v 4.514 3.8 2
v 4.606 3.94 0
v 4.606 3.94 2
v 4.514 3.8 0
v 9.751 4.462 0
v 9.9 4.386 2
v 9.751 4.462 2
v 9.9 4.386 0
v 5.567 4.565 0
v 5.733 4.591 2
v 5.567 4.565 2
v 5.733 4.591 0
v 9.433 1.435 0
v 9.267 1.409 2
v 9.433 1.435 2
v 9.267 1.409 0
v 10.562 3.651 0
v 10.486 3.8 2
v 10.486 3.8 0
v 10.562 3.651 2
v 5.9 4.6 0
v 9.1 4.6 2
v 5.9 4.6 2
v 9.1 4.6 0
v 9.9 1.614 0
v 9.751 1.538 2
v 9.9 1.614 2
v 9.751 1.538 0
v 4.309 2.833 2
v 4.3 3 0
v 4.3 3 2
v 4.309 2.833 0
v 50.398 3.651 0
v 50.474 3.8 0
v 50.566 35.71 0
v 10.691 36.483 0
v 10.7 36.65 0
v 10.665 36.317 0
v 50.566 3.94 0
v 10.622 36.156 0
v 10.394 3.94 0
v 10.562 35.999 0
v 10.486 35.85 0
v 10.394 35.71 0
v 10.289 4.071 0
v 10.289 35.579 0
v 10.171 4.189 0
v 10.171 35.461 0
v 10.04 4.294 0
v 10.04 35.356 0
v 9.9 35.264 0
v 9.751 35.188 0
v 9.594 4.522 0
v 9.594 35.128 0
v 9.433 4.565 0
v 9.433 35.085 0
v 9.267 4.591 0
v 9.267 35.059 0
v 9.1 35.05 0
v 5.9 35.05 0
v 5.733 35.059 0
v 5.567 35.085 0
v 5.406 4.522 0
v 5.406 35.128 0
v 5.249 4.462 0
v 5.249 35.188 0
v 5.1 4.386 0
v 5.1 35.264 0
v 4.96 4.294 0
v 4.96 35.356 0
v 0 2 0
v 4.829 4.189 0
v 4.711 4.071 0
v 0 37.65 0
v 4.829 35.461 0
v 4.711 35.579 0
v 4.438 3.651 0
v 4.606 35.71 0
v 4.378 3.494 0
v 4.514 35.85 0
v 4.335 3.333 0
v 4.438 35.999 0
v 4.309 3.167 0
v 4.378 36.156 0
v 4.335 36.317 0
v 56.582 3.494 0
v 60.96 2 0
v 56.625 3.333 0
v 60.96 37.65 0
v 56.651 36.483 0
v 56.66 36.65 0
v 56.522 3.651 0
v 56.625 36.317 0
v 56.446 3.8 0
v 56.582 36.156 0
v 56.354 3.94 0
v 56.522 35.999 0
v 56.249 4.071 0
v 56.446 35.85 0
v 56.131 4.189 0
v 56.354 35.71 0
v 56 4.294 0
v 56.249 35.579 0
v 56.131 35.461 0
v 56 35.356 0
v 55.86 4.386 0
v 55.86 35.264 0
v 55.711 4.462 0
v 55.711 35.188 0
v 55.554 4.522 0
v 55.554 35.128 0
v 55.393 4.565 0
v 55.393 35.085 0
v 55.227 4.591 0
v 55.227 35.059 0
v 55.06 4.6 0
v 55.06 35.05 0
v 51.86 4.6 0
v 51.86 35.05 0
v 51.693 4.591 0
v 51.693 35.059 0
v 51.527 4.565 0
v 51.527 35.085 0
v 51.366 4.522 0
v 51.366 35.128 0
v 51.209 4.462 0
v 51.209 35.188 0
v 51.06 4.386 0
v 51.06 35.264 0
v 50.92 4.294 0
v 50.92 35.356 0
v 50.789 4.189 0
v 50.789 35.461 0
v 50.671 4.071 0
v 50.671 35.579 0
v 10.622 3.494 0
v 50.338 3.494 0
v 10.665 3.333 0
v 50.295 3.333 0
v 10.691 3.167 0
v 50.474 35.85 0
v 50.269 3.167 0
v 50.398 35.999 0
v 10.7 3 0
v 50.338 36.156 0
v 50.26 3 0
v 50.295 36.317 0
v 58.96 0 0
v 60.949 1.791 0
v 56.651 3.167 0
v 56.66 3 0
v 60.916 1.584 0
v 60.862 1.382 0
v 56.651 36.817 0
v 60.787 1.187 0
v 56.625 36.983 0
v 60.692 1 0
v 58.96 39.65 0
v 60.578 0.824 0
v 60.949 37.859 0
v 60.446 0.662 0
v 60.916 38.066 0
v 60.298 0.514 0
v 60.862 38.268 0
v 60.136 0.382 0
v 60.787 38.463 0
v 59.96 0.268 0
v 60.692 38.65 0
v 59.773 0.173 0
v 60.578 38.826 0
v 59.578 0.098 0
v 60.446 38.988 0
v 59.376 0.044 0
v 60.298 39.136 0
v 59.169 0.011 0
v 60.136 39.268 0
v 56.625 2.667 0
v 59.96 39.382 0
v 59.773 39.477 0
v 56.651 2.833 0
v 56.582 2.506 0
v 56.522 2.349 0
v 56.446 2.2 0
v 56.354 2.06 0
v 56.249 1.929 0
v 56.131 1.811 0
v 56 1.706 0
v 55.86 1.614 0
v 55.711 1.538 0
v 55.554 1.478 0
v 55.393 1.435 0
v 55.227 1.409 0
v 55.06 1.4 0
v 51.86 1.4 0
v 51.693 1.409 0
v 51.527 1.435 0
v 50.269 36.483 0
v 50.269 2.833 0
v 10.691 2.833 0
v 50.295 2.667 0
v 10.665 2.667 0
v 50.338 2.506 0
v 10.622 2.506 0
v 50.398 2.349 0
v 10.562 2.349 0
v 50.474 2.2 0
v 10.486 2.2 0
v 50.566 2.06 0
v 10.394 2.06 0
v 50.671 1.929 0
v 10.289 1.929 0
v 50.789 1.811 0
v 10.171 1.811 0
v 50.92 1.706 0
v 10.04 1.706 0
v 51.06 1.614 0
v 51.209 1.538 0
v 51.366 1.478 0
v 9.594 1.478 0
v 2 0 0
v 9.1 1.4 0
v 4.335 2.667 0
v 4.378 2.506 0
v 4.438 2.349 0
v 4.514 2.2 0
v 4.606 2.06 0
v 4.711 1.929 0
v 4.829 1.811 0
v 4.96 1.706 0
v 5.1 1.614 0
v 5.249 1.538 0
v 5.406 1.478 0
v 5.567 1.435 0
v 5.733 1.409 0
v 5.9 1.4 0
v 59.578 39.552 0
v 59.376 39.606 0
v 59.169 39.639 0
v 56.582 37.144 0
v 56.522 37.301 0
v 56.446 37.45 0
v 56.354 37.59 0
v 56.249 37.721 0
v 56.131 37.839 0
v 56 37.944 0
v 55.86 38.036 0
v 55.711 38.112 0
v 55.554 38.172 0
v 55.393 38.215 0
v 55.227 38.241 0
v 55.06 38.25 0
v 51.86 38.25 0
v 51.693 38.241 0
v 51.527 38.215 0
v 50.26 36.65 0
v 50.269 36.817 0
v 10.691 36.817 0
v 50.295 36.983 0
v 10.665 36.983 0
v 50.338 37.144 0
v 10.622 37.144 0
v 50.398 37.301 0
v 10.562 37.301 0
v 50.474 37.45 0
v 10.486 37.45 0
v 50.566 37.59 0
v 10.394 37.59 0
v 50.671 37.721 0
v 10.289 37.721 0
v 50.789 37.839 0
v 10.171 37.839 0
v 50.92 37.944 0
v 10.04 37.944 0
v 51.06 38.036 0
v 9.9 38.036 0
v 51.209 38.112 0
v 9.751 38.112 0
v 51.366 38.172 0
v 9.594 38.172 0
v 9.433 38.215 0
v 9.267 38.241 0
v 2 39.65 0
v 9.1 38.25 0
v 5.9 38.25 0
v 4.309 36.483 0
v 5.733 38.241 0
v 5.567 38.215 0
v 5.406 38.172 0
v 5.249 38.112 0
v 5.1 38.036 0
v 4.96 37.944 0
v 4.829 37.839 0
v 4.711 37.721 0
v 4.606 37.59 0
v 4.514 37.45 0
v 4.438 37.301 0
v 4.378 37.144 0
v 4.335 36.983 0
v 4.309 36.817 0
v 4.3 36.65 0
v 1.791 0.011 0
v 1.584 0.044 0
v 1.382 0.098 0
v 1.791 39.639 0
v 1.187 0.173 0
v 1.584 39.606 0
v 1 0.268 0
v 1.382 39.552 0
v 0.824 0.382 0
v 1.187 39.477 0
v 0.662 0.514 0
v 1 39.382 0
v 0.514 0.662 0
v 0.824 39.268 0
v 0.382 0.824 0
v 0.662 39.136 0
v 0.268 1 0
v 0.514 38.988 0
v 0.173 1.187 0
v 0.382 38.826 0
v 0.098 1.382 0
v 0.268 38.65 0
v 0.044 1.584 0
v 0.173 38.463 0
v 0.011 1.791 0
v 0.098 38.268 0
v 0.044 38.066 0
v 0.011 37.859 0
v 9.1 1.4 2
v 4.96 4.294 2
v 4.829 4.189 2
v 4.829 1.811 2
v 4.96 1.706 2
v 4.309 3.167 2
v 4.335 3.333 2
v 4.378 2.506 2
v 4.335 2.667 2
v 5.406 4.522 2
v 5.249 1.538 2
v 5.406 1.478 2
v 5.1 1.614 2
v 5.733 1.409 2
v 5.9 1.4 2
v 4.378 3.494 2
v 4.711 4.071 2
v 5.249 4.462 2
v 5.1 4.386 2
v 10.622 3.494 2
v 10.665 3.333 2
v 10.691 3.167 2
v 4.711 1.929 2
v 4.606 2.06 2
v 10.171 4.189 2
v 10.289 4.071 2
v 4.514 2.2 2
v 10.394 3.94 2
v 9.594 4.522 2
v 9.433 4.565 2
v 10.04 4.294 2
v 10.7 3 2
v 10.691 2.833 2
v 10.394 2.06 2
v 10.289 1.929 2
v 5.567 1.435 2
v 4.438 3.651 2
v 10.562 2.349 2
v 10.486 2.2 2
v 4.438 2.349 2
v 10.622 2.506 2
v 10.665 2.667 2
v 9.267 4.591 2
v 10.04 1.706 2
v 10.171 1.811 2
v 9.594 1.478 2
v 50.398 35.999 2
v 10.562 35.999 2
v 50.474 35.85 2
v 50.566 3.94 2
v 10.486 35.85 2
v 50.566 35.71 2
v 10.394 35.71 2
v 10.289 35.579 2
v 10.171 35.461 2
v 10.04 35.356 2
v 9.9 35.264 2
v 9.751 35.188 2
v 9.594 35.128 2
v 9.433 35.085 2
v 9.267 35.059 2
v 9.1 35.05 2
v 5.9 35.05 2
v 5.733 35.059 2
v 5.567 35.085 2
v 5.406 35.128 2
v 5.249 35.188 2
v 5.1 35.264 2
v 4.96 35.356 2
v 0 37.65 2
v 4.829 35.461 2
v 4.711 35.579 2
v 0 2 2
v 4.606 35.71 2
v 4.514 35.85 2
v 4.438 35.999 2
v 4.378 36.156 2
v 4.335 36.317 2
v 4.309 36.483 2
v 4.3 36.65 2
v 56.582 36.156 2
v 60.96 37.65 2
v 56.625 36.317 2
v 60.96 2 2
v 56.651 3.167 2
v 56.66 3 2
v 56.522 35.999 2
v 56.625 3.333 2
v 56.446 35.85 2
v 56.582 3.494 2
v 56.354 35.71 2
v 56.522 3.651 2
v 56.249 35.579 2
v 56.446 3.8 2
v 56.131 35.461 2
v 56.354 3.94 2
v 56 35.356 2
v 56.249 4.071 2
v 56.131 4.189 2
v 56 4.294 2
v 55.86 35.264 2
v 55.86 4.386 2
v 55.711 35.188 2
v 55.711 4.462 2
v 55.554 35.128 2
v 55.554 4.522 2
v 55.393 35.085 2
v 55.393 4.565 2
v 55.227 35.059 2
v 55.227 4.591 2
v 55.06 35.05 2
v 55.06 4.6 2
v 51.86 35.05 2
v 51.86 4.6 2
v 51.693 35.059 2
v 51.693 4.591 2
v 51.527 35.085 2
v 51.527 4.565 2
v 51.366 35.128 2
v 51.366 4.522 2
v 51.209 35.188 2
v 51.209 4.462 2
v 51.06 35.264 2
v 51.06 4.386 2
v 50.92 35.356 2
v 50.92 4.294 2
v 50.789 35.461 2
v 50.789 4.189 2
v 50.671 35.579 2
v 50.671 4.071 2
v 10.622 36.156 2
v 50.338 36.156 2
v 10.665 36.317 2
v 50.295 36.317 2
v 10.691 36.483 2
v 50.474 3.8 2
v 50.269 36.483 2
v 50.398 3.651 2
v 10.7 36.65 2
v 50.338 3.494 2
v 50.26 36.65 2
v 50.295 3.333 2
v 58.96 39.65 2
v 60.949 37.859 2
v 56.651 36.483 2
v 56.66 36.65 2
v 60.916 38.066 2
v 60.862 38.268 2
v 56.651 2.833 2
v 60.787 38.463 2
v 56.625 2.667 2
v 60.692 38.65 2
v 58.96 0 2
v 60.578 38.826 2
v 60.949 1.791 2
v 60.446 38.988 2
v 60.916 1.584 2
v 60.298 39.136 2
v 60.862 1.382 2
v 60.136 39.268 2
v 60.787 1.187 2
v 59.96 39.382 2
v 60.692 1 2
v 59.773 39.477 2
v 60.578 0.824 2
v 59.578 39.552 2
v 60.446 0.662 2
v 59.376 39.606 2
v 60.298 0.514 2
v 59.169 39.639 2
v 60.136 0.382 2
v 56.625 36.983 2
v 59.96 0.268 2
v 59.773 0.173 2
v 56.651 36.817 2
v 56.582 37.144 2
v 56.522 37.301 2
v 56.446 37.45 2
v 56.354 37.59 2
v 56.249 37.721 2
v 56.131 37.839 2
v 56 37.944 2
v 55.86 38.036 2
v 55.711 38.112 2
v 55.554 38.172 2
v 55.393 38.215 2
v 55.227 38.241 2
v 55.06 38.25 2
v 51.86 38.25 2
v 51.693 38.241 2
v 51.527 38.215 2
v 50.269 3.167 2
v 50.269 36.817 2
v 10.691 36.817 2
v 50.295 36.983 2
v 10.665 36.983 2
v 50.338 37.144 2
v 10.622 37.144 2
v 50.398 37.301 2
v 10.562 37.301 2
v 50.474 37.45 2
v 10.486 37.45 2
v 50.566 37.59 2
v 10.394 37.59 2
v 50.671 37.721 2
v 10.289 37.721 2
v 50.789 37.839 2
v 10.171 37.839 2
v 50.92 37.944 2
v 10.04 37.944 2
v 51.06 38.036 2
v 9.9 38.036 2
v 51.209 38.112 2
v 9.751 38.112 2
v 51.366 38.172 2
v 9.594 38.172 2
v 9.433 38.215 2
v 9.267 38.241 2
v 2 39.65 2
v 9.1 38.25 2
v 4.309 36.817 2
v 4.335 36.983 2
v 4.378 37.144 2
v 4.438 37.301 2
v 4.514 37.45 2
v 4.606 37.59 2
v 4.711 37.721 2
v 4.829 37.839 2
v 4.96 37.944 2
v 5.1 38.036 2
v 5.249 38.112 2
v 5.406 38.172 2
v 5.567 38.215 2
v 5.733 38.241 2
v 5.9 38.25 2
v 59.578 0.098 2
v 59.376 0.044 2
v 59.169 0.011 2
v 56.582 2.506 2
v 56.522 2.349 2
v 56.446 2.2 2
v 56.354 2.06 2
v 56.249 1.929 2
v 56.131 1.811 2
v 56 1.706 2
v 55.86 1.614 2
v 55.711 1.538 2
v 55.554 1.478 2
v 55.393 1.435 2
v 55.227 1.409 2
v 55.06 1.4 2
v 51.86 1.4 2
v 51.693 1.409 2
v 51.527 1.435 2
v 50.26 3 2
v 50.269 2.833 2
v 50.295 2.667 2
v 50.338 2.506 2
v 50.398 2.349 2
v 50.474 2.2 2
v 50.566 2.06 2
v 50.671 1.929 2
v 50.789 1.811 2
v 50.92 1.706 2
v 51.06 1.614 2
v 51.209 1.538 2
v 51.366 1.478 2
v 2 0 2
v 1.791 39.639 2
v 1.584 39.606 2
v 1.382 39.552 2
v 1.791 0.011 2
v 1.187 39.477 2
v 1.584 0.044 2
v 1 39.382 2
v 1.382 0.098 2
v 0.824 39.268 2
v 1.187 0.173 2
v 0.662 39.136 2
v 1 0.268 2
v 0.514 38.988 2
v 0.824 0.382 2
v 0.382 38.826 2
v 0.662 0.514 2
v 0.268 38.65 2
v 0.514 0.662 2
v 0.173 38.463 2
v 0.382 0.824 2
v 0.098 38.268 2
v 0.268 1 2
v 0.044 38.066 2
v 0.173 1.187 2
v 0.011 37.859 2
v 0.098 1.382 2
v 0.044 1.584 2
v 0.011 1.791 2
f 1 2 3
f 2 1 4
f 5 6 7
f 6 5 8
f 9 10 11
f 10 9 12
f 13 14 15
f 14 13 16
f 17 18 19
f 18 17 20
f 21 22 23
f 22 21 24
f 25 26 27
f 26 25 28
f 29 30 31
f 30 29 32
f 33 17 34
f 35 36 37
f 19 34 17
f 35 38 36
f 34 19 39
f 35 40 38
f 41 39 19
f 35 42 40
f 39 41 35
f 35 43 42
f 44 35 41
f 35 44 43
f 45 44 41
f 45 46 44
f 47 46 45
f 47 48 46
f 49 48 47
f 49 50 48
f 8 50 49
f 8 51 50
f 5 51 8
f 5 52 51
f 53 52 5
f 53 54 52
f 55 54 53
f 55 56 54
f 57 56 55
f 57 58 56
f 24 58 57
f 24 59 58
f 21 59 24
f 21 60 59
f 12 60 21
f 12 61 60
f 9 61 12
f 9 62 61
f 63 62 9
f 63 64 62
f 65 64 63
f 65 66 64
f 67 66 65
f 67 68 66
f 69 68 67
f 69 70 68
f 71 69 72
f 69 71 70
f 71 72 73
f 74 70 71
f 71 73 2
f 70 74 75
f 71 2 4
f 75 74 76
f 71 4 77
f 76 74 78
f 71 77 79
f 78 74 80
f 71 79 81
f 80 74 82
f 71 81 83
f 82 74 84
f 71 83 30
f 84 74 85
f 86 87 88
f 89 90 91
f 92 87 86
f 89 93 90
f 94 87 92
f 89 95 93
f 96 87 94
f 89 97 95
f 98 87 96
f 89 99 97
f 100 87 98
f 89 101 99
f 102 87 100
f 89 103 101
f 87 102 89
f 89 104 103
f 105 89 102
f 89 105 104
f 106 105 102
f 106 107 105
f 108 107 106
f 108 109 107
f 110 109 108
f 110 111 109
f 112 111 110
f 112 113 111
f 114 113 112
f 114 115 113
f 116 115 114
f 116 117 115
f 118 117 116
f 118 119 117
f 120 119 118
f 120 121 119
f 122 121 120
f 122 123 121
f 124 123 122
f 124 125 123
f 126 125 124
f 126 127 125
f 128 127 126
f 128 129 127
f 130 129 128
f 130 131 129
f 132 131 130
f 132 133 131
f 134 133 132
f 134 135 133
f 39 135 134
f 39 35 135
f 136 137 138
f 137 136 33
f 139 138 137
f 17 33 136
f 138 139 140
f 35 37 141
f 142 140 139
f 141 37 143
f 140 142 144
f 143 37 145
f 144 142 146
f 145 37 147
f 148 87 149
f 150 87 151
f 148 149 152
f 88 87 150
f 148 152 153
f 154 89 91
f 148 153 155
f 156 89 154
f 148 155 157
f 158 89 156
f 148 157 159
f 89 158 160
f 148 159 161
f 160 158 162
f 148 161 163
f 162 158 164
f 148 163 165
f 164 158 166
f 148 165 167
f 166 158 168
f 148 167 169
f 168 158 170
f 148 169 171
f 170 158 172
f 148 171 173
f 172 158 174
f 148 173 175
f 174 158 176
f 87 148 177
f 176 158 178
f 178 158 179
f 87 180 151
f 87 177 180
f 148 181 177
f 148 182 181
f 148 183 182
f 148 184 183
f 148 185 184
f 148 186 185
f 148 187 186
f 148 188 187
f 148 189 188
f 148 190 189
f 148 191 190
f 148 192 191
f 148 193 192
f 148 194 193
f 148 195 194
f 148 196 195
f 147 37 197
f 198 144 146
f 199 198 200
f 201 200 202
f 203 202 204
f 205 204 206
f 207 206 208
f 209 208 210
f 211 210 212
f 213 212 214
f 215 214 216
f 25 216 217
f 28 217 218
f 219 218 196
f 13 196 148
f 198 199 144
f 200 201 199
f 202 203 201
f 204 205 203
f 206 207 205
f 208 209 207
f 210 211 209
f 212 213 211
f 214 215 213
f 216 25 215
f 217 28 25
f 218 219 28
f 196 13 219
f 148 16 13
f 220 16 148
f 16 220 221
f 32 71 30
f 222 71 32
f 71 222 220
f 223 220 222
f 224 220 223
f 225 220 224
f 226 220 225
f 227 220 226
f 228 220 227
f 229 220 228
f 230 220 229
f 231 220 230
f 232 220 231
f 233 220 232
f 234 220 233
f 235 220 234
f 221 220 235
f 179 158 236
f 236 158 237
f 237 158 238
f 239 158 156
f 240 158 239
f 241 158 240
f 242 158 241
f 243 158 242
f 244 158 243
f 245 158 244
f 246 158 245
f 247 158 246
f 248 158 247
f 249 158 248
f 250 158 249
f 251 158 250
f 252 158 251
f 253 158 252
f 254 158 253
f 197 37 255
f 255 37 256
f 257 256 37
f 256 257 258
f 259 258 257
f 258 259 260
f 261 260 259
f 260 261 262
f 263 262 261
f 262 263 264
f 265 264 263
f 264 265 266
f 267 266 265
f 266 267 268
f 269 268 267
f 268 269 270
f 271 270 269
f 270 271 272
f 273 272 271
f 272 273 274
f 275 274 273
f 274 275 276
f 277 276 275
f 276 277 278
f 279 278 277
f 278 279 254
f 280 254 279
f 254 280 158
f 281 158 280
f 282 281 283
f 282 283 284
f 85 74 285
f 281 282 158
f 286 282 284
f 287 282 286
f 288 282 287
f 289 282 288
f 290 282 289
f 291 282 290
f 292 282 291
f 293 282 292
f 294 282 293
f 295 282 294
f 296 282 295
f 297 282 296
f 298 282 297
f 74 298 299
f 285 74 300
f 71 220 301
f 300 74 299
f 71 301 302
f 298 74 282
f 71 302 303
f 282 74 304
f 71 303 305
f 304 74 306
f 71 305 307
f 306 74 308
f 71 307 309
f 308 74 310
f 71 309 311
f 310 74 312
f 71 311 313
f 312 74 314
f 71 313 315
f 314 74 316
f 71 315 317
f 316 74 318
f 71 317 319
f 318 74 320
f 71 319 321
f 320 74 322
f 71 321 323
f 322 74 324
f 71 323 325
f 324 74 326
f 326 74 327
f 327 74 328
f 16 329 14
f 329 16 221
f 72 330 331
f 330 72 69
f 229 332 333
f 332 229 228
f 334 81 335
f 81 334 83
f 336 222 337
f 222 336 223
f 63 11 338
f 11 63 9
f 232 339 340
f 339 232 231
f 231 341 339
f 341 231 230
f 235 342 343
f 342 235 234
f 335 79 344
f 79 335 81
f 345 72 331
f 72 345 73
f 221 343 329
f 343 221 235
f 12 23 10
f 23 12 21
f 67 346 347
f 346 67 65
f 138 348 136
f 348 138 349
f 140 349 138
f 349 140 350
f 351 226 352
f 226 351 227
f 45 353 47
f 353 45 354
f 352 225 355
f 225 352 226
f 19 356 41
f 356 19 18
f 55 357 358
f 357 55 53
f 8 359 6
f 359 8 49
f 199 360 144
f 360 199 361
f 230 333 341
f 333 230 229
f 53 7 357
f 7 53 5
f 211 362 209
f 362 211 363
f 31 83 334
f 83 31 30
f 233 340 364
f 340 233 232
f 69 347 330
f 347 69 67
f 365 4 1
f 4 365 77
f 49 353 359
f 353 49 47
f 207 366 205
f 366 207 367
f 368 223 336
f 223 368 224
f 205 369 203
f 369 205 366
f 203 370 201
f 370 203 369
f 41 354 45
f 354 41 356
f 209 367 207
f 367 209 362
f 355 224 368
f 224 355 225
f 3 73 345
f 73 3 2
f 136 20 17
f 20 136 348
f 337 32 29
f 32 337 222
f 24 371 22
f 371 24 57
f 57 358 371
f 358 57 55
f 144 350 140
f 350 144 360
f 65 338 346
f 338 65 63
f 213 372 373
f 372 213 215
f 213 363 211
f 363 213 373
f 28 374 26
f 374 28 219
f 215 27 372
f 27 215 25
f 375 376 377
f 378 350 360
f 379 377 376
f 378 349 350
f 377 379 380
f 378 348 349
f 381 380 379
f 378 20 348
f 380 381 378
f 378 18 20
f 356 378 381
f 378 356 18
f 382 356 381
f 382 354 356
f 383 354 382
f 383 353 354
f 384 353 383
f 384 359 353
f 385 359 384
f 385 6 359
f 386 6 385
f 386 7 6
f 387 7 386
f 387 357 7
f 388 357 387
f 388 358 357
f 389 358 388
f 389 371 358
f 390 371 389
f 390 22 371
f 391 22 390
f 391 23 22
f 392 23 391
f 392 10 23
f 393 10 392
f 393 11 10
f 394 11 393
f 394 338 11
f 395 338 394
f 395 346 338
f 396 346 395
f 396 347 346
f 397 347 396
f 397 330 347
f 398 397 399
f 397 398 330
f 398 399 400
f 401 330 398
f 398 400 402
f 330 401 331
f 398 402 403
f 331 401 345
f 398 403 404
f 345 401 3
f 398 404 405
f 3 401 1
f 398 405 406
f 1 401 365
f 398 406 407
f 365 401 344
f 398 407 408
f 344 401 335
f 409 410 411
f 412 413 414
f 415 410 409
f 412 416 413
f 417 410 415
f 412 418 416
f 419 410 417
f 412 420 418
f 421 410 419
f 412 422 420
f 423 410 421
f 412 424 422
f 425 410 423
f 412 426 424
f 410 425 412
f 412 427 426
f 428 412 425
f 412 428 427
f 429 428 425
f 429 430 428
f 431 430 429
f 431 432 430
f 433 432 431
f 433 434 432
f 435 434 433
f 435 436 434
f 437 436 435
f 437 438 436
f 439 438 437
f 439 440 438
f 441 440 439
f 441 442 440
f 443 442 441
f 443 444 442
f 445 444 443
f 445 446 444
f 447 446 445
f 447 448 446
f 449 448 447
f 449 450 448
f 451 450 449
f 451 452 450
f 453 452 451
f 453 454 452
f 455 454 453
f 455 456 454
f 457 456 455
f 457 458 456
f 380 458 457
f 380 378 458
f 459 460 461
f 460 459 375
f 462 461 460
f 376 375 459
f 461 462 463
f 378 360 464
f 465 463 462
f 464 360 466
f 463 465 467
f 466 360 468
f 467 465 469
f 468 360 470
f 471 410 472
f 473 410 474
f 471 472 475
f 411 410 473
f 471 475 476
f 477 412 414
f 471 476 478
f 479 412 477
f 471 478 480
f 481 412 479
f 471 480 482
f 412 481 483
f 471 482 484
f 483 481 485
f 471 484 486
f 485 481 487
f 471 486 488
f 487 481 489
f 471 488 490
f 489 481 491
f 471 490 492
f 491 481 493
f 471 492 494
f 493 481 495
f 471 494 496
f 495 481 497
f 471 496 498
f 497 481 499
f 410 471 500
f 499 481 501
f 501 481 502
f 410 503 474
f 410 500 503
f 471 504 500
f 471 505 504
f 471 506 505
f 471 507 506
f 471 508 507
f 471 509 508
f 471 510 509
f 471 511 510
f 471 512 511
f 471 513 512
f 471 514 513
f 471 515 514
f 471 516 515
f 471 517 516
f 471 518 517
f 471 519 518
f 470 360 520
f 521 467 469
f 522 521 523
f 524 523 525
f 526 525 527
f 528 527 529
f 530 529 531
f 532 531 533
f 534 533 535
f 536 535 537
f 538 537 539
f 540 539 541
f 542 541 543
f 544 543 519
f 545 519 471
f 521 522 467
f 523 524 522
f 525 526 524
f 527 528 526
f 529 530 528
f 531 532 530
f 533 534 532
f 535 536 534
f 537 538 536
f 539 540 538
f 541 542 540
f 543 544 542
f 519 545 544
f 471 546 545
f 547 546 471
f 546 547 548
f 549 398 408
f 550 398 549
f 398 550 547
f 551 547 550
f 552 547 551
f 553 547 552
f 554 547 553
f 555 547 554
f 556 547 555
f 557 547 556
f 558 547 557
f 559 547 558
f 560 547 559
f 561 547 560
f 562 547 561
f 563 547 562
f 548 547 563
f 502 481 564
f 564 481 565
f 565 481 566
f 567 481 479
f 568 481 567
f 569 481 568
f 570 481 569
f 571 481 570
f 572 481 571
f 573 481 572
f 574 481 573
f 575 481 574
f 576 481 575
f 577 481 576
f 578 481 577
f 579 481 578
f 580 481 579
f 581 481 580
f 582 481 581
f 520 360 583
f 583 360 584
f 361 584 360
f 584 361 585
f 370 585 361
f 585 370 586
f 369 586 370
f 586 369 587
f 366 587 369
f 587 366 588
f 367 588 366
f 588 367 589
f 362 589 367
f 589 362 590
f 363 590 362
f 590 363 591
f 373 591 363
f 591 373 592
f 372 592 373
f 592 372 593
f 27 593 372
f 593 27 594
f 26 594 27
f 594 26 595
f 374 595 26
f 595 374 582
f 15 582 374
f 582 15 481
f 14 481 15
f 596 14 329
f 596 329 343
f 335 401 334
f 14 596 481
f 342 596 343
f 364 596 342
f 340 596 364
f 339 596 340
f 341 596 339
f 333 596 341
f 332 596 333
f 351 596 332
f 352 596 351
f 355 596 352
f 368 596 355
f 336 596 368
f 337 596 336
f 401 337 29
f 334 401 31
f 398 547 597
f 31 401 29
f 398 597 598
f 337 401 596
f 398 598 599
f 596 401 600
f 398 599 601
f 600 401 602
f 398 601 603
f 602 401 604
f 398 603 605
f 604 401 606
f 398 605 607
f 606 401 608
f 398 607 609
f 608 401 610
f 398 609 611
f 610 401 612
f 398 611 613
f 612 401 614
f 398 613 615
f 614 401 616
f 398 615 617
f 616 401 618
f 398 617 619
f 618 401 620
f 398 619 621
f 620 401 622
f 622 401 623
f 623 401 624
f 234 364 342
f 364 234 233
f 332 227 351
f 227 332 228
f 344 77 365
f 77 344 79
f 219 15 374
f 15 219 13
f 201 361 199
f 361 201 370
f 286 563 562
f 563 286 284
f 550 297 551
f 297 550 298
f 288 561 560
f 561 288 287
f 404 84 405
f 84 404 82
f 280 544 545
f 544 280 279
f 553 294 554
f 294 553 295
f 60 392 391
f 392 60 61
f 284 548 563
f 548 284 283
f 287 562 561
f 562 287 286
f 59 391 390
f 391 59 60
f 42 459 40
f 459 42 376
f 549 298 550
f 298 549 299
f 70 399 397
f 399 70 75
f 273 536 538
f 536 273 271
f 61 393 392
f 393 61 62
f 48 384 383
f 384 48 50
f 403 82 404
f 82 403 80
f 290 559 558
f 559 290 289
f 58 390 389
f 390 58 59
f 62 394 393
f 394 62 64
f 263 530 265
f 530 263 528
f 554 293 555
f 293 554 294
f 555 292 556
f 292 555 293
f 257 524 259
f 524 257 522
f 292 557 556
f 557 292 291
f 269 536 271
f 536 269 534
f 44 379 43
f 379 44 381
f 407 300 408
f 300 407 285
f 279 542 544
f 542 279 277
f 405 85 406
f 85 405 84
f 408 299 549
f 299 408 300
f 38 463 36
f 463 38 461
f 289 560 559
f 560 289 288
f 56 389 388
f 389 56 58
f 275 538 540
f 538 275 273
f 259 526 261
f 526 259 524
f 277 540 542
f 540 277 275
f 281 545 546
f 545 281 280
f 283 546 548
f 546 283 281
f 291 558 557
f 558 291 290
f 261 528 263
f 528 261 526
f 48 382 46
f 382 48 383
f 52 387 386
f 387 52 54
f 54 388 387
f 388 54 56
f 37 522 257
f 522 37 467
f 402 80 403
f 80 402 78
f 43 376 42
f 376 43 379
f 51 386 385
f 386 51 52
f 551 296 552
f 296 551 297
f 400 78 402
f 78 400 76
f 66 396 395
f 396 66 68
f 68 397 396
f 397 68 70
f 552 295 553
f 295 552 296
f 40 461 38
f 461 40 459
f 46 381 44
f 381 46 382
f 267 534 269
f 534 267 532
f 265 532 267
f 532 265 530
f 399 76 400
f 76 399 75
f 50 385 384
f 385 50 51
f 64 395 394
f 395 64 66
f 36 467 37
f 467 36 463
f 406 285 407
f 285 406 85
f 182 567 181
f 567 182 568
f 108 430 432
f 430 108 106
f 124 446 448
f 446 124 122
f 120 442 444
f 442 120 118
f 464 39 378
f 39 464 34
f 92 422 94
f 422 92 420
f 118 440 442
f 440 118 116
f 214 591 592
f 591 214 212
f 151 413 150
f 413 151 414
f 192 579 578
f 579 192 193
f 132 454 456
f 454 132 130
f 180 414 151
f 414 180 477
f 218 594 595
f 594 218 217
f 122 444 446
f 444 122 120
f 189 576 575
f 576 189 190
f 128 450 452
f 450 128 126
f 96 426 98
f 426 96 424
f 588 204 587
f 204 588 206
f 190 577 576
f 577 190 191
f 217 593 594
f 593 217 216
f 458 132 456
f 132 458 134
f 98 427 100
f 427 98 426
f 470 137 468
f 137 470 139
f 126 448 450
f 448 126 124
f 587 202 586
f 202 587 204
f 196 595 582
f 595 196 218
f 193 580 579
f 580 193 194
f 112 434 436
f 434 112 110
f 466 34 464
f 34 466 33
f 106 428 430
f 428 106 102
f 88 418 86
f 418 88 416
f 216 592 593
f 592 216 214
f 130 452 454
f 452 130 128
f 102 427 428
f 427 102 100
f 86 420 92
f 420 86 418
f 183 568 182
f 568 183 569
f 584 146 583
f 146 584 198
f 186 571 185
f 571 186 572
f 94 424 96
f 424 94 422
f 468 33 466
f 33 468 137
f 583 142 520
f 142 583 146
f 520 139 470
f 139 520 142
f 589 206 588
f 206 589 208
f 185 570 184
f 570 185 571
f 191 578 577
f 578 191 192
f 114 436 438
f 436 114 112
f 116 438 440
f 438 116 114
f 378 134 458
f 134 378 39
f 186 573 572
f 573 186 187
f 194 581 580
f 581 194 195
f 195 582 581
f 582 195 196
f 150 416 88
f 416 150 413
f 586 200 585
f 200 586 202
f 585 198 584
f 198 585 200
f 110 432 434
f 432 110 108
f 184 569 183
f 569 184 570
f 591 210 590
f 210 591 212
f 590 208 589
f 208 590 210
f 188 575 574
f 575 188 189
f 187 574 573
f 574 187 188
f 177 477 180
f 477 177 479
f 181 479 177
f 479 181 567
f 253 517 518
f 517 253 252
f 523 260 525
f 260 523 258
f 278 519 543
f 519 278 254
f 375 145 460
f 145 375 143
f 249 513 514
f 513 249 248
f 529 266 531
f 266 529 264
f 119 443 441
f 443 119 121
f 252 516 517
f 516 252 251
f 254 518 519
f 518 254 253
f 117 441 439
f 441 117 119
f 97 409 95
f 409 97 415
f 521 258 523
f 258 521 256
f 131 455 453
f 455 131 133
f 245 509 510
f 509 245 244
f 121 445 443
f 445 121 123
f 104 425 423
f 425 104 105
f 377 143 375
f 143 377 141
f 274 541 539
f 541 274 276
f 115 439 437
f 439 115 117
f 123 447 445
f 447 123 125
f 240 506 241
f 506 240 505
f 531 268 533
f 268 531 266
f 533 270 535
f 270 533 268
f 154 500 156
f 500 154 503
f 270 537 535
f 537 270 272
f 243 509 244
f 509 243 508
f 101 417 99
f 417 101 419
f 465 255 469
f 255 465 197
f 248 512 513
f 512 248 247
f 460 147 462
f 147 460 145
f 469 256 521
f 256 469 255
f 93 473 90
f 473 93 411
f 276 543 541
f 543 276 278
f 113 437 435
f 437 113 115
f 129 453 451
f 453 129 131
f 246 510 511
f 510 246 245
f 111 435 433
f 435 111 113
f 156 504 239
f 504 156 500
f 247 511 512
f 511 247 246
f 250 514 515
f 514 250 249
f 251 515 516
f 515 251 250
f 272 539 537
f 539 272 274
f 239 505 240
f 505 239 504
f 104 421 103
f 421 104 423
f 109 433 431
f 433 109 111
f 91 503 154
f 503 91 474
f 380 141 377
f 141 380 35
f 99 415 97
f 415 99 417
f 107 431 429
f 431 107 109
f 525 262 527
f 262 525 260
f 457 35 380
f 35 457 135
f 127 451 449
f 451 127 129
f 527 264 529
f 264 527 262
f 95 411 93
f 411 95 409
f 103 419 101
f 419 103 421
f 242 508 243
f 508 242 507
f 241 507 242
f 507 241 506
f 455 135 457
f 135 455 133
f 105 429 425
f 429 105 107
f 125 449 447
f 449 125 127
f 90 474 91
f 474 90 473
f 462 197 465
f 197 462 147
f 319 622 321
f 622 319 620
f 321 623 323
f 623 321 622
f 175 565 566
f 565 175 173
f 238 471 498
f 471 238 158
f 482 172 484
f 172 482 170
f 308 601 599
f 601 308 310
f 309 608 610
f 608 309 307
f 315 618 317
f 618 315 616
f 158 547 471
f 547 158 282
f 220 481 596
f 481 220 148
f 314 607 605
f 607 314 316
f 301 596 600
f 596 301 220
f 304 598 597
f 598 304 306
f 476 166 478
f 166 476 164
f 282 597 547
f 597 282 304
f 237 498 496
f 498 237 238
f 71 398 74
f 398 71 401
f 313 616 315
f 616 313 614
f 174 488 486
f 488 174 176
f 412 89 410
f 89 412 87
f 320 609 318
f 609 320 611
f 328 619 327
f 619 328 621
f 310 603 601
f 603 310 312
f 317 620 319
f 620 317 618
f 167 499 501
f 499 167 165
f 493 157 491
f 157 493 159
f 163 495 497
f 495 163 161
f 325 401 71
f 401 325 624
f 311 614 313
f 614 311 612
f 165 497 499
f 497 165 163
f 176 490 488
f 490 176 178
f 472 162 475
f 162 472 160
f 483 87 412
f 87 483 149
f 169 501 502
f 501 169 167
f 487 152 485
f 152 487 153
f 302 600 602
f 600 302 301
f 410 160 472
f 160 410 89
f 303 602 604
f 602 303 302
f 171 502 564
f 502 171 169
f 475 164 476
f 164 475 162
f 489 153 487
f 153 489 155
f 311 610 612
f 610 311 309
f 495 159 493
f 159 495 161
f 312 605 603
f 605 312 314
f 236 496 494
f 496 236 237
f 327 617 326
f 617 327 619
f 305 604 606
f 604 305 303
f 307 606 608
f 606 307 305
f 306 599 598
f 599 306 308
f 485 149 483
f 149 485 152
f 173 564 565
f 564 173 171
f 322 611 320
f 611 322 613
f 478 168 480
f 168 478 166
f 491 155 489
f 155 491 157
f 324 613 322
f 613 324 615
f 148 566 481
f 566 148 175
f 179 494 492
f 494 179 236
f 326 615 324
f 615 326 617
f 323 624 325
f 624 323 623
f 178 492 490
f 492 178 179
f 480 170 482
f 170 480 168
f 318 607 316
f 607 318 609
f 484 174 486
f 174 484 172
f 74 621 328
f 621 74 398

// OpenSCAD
//
// PARAMETRIC EURORACK BLANK PANELS
//
// Blank panels for eurorack modular synth, based on intellijel specifications. Modular design: export custom sized panels.
//
// My boyfriend spends a lot of his hard-earned cash on modular synth accessories. I made him some blank panels in matt black PLA+. After receiving the first panel he asked for a different size, and then one more… so I made a parametric design, to generate every possible size.
// Feel free to use, share, remix, and give them to your modular friends. Spread some good vibes. Don't sell for a profit – modulars are already pricey enough.
//
// Author: RobotAnna
// https://www.printables.com/@RobotAnna
//
// CC Attribution-NonCommercial-ShareAlike 4.0 International
// http://creativecommons.org/licenses/by-nc-sa/4.0/
//
// References
// IJ specifications: https://intellijel.com/support/1u-technical-specifications/
// Doepfer A-100 Construction Details: https://www.doepfer.de/a100_man/a100m_e.htm


// PARAMETERS
p_u         =  1;   // Height Units (U), 1 or 3. 1U = 39.65 mm tall, 3U = 128.5 mm tall.
p_hp        =  12;   // Width Horizontal Pitch (HP), 2 - 32
p_ribs      =  0;   // Do you want ribs? 1=yes, 0=no
p_label     =  1;   // Do you want a label? 1=yes, 0=no

p_tolerance =  0.2;  // Do you want wiggle-room, or a tight fit? 0 mm for a tight fit.
p_smoothing = 60;    // cylinder smoothing, also for text: set to 60 while designing, and up to 300 for the final render.


// CONSTANTS
c_height       = 2;    // Thickness of the plate in mm; I recommend to keep this at 2 mm.
c_bevel_radius = 2;    // Size of the rounded corner. 2 mm looks ok to me; if you make it too large, it will overlap the hole.
c_hole_dia     = 3.2;  // hole diameter = 3.2 mm
c_hole_to_side = 7.5;  // distance from center of hole to side edge = 7.5 mm
c_hole_to_top  = 3;    // distance from center of hole to top edge = 3 mm


// DERIVED
d_width = p_hp * 5.08; // Width is measured in HP, 1 HP = 5.08 mm
d_depth = (p_u == 1) ? 39.65 : 128.5;

// if p_hp is 5 or less: only place 1 hole top and bottom. if 6 or more: 2 holes.


// MODULES
// colors are not necessary, it just helps to debug the code
// Purple -- Thistle, MediumPurple
// Pinks  -- MistyRose, Violet, LightPink
// Blues  -- PowderBlue, DeepSkyBlue
// Browns -- Cornsilk, Wheat, Tan
// Greens -- PaleGreen, LightSeaGreen
// Reds   -- LightCoral, IndianRed
// Orange -- LightSalmon, Orange
// Yellow -- LemonChiffon, Khaki
// Whites -- White, Ivory
// Grays  -- Gainsboro, Silver

module baseplate() {
    color("LightSeaGreen")
    translate([c_bevel_radius, c_bevel_radius, 0])
    minkowski() {
        cube([d_width - 2*c_bevel_radius, d_depth - 2*c_bevel_radius, c_height/2], center=false);
        cylinder(c_height/2, d=2*c_bevel_radius, center=false, $fn=p_smoothing);
    }
}

module platehole() {
    color("Wheat")
    hull() {
        translate([0, 0, 0])
        cylinder(h=c_height, d=c_hole_dia, center=false, $fn=p_smoothing);
        translate([c_hole_dia, 0, 0])
        cylinder(h=c_height, d=c_hole_dia, center=false, $fn=p_smoothing);
    }
}


module holed_baseplate() {
difference() {
    baseplate();

    if (p_hp < 6) { // HP is 5 or less: only one hole top and bottom

        color("MistyRose")
        translate([d_width/2 - c_hole_dia/2, c_hole_to_top, 0])
        platehole();

        color("Thistle")
        translate([d_width/2 - c_hole_dia/2, d_depth-c_hole_to_top, 0])
        platehole();

    } else { // HP is 6 or more: two holes top and bottom

        color("LightCoral")
        translate([c_hole_to_side - c_hole_dia/2, c_hole_to_top, 0])
        platehole();

        color("MistyRose")
        translate([c_hole_to_side - c_hole_dia/2, d_depth - c_hole_to_top, 0])
        platehole();

        color("Thistle")
        translate([d_width - c_hole_to_side - c_hole_dia/2, c_hole_to_top, 0])
        platehole();

        color("White")
        translate([d_width - c_hole_to_side - c_hole_dia/2, d_depth - c_hole_to_top, 0])
        platehole();
    }
    }
}

// PUT IT ALL TOGETHER
holed_baseplate();
